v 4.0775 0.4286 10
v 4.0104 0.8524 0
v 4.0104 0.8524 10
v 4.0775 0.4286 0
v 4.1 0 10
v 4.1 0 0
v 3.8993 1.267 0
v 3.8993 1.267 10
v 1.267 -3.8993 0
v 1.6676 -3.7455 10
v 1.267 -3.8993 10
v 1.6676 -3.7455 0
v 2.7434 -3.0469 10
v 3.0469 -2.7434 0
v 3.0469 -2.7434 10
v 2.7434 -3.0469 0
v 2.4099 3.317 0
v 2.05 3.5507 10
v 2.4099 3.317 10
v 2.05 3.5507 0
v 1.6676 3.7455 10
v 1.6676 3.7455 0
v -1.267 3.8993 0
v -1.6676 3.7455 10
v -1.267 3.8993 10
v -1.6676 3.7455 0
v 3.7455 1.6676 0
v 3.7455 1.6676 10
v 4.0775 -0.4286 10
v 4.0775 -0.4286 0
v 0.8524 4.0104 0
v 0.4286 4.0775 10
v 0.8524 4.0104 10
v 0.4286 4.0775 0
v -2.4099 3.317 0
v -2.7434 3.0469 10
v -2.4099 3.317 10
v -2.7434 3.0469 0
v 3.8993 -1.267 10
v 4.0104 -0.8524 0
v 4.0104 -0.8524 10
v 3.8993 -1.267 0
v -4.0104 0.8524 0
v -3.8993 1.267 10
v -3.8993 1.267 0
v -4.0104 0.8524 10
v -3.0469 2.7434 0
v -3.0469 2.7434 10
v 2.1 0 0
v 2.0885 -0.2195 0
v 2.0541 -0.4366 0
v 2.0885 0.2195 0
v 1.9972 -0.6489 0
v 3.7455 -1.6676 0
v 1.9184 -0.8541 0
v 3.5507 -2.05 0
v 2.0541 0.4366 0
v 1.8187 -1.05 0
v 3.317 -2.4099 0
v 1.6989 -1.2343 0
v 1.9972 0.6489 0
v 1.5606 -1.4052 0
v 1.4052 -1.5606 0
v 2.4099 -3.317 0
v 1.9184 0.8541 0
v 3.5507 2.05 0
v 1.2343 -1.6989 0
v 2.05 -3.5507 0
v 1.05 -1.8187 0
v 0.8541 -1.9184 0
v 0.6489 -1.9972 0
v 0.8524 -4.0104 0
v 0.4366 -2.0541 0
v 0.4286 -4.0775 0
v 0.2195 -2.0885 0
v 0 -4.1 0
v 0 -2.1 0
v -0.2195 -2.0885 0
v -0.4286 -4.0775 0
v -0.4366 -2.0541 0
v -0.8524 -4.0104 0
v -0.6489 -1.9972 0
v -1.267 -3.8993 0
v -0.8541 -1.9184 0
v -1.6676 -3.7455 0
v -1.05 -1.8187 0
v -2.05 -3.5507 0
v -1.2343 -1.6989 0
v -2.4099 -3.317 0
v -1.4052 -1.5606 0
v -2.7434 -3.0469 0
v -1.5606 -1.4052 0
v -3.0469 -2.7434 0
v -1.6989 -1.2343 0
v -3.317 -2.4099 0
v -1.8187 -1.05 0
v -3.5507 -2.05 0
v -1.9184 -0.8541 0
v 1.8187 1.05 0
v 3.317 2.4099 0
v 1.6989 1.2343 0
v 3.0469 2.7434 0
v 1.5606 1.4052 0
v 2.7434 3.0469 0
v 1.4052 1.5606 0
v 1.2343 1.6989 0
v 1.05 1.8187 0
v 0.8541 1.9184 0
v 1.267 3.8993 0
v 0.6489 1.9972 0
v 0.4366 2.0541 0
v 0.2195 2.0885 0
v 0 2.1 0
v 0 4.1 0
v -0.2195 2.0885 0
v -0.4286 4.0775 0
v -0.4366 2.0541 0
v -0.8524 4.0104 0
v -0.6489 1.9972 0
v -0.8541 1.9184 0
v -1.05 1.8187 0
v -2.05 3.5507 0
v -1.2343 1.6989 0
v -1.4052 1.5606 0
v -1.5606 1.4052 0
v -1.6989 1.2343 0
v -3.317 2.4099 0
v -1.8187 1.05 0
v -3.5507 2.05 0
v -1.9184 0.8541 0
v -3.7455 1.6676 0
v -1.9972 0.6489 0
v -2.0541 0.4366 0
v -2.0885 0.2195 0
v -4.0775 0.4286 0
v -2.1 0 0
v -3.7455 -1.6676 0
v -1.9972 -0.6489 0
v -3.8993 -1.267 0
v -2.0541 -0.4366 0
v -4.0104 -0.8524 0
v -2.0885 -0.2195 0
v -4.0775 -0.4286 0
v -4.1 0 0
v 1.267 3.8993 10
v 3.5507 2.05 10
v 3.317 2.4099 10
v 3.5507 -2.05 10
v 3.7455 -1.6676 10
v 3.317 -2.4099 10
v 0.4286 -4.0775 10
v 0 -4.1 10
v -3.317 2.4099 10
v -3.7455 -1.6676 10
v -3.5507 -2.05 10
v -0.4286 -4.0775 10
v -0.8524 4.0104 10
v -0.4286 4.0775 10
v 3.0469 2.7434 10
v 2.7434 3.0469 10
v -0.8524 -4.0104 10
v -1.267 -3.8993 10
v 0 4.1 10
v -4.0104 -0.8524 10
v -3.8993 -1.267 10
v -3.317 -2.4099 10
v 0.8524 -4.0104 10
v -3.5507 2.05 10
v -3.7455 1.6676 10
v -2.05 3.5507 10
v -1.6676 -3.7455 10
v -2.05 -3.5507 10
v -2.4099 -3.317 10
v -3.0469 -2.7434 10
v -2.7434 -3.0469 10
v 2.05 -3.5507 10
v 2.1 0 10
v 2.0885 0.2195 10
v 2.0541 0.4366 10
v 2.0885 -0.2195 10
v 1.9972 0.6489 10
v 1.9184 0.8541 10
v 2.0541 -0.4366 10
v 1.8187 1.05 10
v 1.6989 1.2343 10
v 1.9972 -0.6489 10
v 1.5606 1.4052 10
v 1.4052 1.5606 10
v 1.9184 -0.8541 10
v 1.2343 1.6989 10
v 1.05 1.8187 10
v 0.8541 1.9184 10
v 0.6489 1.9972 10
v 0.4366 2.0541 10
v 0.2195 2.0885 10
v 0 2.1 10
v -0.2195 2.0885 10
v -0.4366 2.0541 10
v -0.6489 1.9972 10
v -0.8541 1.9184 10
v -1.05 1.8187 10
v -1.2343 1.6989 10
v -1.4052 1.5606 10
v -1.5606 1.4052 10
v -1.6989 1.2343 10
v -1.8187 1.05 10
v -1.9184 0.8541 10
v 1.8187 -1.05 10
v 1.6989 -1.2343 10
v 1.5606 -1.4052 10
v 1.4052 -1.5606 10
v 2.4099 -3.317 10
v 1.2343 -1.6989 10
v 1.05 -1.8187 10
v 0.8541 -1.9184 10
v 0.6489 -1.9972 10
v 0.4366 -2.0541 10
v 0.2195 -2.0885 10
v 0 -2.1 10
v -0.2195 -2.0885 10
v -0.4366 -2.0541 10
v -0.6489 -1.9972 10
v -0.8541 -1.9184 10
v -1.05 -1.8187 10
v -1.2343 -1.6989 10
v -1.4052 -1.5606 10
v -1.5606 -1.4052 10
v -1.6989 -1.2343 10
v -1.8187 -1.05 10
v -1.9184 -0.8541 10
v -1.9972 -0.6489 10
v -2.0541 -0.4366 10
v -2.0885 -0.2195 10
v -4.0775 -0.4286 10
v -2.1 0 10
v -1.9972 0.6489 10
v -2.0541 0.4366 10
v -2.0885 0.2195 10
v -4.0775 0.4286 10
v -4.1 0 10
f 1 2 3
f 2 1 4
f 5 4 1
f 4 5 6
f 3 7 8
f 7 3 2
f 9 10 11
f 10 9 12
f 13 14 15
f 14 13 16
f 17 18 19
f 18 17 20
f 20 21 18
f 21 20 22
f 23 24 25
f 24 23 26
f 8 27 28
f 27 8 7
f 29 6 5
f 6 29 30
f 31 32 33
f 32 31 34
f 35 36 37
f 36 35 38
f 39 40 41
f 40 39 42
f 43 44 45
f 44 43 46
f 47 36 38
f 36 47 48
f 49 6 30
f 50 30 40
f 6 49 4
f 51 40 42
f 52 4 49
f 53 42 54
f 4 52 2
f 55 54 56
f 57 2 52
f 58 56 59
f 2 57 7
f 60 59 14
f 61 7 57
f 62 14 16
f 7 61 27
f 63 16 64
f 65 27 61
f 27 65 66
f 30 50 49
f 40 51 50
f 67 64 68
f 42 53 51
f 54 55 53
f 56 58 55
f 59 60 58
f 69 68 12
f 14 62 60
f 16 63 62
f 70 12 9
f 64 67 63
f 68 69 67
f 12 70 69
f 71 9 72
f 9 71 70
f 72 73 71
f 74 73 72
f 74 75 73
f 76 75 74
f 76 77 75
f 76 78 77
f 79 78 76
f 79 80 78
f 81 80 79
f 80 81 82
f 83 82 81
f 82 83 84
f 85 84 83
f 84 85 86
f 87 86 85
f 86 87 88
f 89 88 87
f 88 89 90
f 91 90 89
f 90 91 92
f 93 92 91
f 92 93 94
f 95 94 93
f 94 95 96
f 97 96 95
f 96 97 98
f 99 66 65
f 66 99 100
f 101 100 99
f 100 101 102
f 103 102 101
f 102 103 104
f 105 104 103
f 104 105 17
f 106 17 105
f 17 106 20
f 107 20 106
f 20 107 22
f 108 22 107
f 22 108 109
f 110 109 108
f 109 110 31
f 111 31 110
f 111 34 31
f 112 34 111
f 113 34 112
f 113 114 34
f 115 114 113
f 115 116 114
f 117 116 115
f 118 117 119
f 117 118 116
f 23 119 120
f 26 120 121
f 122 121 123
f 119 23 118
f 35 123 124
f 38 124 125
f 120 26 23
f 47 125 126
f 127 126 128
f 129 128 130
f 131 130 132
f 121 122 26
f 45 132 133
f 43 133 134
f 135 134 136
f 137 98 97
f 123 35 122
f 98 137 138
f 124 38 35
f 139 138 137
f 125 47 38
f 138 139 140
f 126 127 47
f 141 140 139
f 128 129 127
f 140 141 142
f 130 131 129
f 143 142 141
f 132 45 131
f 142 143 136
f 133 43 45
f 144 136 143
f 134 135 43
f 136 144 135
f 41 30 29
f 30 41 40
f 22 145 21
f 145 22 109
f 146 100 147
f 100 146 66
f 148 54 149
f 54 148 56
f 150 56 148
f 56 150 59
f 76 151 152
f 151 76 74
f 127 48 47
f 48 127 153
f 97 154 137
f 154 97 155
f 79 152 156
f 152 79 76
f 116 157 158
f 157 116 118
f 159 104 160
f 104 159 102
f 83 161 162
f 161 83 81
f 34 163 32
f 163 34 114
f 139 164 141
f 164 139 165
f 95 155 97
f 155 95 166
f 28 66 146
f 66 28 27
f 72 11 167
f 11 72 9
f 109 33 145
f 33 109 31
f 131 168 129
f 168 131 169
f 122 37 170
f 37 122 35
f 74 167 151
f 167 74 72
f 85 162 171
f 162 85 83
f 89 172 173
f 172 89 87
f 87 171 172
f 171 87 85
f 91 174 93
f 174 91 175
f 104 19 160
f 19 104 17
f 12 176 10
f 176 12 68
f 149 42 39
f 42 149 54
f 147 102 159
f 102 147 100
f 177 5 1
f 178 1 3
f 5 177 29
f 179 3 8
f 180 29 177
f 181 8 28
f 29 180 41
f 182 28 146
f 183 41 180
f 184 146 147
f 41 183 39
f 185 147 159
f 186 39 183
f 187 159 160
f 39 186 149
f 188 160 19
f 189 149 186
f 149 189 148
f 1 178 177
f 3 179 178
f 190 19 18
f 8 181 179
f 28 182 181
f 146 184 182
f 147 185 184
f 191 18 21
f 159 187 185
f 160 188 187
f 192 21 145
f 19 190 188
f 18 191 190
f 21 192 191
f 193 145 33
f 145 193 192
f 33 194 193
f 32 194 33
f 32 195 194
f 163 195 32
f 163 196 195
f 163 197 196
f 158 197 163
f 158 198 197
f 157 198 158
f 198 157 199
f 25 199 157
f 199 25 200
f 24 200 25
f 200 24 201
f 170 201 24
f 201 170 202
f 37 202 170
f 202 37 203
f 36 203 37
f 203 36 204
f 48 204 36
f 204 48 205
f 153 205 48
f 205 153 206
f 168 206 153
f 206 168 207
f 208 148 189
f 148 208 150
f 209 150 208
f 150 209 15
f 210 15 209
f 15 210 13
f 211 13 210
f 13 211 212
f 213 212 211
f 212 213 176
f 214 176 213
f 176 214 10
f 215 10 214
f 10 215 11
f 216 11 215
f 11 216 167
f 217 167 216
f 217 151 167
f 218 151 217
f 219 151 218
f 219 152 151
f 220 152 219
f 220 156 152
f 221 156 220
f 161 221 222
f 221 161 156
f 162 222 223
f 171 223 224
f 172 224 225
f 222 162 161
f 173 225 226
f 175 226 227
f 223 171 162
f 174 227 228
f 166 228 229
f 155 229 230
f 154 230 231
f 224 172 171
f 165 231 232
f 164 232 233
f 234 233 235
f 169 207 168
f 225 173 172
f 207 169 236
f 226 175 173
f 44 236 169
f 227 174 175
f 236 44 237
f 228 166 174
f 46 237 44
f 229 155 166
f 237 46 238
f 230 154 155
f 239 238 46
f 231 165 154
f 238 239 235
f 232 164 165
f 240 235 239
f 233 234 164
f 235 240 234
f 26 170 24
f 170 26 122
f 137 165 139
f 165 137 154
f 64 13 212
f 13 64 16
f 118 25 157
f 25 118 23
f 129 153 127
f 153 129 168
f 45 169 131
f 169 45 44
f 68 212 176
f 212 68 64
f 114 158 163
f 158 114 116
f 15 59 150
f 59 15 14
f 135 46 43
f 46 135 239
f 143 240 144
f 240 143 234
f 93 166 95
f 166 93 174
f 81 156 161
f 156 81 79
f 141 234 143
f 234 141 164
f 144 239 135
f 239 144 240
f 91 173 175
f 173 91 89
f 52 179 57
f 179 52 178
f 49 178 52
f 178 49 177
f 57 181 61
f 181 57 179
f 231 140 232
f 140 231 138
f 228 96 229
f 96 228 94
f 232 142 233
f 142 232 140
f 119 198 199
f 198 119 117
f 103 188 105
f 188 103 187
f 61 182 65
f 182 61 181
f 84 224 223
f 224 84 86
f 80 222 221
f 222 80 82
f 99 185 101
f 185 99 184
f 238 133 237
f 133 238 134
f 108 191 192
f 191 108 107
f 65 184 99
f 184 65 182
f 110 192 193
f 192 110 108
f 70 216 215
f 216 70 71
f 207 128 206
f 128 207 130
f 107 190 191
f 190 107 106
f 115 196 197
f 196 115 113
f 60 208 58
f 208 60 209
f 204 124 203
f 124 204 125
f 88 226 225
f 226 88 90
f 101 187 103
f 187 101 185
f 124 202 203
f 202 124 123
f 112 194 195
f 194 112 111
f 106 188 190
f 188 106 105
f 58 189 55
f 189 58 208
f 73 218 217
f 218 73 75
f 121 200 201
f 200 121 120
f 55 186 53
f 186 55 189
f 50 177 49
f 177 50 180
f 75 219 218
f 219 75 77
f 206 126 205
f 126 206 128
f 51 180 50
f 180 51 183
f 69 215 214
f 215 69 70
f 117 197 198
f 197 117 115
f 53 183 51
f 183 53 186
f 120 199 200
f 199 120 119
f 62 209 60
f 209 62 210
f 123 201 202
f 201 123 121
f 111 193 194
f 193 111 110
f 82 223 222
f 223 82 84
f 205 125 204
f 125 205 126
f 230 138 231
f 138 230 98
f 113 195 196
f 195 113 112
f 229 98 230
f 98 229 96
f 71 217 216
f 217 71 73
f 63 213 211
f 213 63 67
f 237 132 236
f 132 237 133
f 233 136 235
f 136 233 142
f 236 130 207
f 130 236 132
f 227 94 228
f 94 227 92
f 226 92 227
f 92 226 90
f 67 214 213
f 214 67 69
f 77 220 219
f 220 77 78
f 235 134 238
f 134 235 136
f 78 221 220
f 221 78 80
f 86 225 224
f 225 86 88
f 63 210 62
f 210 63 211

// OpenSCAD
length=10;
thickness=2;
screw_diameter=4.2;

screw_spacer();

module screw_spacer() {
  $fn=60;
  difference() {
    cylinder(d=screw_diameter+thickness*2,h=length);
    cylinder(d=screw_diameter,h=length);
  }
}
